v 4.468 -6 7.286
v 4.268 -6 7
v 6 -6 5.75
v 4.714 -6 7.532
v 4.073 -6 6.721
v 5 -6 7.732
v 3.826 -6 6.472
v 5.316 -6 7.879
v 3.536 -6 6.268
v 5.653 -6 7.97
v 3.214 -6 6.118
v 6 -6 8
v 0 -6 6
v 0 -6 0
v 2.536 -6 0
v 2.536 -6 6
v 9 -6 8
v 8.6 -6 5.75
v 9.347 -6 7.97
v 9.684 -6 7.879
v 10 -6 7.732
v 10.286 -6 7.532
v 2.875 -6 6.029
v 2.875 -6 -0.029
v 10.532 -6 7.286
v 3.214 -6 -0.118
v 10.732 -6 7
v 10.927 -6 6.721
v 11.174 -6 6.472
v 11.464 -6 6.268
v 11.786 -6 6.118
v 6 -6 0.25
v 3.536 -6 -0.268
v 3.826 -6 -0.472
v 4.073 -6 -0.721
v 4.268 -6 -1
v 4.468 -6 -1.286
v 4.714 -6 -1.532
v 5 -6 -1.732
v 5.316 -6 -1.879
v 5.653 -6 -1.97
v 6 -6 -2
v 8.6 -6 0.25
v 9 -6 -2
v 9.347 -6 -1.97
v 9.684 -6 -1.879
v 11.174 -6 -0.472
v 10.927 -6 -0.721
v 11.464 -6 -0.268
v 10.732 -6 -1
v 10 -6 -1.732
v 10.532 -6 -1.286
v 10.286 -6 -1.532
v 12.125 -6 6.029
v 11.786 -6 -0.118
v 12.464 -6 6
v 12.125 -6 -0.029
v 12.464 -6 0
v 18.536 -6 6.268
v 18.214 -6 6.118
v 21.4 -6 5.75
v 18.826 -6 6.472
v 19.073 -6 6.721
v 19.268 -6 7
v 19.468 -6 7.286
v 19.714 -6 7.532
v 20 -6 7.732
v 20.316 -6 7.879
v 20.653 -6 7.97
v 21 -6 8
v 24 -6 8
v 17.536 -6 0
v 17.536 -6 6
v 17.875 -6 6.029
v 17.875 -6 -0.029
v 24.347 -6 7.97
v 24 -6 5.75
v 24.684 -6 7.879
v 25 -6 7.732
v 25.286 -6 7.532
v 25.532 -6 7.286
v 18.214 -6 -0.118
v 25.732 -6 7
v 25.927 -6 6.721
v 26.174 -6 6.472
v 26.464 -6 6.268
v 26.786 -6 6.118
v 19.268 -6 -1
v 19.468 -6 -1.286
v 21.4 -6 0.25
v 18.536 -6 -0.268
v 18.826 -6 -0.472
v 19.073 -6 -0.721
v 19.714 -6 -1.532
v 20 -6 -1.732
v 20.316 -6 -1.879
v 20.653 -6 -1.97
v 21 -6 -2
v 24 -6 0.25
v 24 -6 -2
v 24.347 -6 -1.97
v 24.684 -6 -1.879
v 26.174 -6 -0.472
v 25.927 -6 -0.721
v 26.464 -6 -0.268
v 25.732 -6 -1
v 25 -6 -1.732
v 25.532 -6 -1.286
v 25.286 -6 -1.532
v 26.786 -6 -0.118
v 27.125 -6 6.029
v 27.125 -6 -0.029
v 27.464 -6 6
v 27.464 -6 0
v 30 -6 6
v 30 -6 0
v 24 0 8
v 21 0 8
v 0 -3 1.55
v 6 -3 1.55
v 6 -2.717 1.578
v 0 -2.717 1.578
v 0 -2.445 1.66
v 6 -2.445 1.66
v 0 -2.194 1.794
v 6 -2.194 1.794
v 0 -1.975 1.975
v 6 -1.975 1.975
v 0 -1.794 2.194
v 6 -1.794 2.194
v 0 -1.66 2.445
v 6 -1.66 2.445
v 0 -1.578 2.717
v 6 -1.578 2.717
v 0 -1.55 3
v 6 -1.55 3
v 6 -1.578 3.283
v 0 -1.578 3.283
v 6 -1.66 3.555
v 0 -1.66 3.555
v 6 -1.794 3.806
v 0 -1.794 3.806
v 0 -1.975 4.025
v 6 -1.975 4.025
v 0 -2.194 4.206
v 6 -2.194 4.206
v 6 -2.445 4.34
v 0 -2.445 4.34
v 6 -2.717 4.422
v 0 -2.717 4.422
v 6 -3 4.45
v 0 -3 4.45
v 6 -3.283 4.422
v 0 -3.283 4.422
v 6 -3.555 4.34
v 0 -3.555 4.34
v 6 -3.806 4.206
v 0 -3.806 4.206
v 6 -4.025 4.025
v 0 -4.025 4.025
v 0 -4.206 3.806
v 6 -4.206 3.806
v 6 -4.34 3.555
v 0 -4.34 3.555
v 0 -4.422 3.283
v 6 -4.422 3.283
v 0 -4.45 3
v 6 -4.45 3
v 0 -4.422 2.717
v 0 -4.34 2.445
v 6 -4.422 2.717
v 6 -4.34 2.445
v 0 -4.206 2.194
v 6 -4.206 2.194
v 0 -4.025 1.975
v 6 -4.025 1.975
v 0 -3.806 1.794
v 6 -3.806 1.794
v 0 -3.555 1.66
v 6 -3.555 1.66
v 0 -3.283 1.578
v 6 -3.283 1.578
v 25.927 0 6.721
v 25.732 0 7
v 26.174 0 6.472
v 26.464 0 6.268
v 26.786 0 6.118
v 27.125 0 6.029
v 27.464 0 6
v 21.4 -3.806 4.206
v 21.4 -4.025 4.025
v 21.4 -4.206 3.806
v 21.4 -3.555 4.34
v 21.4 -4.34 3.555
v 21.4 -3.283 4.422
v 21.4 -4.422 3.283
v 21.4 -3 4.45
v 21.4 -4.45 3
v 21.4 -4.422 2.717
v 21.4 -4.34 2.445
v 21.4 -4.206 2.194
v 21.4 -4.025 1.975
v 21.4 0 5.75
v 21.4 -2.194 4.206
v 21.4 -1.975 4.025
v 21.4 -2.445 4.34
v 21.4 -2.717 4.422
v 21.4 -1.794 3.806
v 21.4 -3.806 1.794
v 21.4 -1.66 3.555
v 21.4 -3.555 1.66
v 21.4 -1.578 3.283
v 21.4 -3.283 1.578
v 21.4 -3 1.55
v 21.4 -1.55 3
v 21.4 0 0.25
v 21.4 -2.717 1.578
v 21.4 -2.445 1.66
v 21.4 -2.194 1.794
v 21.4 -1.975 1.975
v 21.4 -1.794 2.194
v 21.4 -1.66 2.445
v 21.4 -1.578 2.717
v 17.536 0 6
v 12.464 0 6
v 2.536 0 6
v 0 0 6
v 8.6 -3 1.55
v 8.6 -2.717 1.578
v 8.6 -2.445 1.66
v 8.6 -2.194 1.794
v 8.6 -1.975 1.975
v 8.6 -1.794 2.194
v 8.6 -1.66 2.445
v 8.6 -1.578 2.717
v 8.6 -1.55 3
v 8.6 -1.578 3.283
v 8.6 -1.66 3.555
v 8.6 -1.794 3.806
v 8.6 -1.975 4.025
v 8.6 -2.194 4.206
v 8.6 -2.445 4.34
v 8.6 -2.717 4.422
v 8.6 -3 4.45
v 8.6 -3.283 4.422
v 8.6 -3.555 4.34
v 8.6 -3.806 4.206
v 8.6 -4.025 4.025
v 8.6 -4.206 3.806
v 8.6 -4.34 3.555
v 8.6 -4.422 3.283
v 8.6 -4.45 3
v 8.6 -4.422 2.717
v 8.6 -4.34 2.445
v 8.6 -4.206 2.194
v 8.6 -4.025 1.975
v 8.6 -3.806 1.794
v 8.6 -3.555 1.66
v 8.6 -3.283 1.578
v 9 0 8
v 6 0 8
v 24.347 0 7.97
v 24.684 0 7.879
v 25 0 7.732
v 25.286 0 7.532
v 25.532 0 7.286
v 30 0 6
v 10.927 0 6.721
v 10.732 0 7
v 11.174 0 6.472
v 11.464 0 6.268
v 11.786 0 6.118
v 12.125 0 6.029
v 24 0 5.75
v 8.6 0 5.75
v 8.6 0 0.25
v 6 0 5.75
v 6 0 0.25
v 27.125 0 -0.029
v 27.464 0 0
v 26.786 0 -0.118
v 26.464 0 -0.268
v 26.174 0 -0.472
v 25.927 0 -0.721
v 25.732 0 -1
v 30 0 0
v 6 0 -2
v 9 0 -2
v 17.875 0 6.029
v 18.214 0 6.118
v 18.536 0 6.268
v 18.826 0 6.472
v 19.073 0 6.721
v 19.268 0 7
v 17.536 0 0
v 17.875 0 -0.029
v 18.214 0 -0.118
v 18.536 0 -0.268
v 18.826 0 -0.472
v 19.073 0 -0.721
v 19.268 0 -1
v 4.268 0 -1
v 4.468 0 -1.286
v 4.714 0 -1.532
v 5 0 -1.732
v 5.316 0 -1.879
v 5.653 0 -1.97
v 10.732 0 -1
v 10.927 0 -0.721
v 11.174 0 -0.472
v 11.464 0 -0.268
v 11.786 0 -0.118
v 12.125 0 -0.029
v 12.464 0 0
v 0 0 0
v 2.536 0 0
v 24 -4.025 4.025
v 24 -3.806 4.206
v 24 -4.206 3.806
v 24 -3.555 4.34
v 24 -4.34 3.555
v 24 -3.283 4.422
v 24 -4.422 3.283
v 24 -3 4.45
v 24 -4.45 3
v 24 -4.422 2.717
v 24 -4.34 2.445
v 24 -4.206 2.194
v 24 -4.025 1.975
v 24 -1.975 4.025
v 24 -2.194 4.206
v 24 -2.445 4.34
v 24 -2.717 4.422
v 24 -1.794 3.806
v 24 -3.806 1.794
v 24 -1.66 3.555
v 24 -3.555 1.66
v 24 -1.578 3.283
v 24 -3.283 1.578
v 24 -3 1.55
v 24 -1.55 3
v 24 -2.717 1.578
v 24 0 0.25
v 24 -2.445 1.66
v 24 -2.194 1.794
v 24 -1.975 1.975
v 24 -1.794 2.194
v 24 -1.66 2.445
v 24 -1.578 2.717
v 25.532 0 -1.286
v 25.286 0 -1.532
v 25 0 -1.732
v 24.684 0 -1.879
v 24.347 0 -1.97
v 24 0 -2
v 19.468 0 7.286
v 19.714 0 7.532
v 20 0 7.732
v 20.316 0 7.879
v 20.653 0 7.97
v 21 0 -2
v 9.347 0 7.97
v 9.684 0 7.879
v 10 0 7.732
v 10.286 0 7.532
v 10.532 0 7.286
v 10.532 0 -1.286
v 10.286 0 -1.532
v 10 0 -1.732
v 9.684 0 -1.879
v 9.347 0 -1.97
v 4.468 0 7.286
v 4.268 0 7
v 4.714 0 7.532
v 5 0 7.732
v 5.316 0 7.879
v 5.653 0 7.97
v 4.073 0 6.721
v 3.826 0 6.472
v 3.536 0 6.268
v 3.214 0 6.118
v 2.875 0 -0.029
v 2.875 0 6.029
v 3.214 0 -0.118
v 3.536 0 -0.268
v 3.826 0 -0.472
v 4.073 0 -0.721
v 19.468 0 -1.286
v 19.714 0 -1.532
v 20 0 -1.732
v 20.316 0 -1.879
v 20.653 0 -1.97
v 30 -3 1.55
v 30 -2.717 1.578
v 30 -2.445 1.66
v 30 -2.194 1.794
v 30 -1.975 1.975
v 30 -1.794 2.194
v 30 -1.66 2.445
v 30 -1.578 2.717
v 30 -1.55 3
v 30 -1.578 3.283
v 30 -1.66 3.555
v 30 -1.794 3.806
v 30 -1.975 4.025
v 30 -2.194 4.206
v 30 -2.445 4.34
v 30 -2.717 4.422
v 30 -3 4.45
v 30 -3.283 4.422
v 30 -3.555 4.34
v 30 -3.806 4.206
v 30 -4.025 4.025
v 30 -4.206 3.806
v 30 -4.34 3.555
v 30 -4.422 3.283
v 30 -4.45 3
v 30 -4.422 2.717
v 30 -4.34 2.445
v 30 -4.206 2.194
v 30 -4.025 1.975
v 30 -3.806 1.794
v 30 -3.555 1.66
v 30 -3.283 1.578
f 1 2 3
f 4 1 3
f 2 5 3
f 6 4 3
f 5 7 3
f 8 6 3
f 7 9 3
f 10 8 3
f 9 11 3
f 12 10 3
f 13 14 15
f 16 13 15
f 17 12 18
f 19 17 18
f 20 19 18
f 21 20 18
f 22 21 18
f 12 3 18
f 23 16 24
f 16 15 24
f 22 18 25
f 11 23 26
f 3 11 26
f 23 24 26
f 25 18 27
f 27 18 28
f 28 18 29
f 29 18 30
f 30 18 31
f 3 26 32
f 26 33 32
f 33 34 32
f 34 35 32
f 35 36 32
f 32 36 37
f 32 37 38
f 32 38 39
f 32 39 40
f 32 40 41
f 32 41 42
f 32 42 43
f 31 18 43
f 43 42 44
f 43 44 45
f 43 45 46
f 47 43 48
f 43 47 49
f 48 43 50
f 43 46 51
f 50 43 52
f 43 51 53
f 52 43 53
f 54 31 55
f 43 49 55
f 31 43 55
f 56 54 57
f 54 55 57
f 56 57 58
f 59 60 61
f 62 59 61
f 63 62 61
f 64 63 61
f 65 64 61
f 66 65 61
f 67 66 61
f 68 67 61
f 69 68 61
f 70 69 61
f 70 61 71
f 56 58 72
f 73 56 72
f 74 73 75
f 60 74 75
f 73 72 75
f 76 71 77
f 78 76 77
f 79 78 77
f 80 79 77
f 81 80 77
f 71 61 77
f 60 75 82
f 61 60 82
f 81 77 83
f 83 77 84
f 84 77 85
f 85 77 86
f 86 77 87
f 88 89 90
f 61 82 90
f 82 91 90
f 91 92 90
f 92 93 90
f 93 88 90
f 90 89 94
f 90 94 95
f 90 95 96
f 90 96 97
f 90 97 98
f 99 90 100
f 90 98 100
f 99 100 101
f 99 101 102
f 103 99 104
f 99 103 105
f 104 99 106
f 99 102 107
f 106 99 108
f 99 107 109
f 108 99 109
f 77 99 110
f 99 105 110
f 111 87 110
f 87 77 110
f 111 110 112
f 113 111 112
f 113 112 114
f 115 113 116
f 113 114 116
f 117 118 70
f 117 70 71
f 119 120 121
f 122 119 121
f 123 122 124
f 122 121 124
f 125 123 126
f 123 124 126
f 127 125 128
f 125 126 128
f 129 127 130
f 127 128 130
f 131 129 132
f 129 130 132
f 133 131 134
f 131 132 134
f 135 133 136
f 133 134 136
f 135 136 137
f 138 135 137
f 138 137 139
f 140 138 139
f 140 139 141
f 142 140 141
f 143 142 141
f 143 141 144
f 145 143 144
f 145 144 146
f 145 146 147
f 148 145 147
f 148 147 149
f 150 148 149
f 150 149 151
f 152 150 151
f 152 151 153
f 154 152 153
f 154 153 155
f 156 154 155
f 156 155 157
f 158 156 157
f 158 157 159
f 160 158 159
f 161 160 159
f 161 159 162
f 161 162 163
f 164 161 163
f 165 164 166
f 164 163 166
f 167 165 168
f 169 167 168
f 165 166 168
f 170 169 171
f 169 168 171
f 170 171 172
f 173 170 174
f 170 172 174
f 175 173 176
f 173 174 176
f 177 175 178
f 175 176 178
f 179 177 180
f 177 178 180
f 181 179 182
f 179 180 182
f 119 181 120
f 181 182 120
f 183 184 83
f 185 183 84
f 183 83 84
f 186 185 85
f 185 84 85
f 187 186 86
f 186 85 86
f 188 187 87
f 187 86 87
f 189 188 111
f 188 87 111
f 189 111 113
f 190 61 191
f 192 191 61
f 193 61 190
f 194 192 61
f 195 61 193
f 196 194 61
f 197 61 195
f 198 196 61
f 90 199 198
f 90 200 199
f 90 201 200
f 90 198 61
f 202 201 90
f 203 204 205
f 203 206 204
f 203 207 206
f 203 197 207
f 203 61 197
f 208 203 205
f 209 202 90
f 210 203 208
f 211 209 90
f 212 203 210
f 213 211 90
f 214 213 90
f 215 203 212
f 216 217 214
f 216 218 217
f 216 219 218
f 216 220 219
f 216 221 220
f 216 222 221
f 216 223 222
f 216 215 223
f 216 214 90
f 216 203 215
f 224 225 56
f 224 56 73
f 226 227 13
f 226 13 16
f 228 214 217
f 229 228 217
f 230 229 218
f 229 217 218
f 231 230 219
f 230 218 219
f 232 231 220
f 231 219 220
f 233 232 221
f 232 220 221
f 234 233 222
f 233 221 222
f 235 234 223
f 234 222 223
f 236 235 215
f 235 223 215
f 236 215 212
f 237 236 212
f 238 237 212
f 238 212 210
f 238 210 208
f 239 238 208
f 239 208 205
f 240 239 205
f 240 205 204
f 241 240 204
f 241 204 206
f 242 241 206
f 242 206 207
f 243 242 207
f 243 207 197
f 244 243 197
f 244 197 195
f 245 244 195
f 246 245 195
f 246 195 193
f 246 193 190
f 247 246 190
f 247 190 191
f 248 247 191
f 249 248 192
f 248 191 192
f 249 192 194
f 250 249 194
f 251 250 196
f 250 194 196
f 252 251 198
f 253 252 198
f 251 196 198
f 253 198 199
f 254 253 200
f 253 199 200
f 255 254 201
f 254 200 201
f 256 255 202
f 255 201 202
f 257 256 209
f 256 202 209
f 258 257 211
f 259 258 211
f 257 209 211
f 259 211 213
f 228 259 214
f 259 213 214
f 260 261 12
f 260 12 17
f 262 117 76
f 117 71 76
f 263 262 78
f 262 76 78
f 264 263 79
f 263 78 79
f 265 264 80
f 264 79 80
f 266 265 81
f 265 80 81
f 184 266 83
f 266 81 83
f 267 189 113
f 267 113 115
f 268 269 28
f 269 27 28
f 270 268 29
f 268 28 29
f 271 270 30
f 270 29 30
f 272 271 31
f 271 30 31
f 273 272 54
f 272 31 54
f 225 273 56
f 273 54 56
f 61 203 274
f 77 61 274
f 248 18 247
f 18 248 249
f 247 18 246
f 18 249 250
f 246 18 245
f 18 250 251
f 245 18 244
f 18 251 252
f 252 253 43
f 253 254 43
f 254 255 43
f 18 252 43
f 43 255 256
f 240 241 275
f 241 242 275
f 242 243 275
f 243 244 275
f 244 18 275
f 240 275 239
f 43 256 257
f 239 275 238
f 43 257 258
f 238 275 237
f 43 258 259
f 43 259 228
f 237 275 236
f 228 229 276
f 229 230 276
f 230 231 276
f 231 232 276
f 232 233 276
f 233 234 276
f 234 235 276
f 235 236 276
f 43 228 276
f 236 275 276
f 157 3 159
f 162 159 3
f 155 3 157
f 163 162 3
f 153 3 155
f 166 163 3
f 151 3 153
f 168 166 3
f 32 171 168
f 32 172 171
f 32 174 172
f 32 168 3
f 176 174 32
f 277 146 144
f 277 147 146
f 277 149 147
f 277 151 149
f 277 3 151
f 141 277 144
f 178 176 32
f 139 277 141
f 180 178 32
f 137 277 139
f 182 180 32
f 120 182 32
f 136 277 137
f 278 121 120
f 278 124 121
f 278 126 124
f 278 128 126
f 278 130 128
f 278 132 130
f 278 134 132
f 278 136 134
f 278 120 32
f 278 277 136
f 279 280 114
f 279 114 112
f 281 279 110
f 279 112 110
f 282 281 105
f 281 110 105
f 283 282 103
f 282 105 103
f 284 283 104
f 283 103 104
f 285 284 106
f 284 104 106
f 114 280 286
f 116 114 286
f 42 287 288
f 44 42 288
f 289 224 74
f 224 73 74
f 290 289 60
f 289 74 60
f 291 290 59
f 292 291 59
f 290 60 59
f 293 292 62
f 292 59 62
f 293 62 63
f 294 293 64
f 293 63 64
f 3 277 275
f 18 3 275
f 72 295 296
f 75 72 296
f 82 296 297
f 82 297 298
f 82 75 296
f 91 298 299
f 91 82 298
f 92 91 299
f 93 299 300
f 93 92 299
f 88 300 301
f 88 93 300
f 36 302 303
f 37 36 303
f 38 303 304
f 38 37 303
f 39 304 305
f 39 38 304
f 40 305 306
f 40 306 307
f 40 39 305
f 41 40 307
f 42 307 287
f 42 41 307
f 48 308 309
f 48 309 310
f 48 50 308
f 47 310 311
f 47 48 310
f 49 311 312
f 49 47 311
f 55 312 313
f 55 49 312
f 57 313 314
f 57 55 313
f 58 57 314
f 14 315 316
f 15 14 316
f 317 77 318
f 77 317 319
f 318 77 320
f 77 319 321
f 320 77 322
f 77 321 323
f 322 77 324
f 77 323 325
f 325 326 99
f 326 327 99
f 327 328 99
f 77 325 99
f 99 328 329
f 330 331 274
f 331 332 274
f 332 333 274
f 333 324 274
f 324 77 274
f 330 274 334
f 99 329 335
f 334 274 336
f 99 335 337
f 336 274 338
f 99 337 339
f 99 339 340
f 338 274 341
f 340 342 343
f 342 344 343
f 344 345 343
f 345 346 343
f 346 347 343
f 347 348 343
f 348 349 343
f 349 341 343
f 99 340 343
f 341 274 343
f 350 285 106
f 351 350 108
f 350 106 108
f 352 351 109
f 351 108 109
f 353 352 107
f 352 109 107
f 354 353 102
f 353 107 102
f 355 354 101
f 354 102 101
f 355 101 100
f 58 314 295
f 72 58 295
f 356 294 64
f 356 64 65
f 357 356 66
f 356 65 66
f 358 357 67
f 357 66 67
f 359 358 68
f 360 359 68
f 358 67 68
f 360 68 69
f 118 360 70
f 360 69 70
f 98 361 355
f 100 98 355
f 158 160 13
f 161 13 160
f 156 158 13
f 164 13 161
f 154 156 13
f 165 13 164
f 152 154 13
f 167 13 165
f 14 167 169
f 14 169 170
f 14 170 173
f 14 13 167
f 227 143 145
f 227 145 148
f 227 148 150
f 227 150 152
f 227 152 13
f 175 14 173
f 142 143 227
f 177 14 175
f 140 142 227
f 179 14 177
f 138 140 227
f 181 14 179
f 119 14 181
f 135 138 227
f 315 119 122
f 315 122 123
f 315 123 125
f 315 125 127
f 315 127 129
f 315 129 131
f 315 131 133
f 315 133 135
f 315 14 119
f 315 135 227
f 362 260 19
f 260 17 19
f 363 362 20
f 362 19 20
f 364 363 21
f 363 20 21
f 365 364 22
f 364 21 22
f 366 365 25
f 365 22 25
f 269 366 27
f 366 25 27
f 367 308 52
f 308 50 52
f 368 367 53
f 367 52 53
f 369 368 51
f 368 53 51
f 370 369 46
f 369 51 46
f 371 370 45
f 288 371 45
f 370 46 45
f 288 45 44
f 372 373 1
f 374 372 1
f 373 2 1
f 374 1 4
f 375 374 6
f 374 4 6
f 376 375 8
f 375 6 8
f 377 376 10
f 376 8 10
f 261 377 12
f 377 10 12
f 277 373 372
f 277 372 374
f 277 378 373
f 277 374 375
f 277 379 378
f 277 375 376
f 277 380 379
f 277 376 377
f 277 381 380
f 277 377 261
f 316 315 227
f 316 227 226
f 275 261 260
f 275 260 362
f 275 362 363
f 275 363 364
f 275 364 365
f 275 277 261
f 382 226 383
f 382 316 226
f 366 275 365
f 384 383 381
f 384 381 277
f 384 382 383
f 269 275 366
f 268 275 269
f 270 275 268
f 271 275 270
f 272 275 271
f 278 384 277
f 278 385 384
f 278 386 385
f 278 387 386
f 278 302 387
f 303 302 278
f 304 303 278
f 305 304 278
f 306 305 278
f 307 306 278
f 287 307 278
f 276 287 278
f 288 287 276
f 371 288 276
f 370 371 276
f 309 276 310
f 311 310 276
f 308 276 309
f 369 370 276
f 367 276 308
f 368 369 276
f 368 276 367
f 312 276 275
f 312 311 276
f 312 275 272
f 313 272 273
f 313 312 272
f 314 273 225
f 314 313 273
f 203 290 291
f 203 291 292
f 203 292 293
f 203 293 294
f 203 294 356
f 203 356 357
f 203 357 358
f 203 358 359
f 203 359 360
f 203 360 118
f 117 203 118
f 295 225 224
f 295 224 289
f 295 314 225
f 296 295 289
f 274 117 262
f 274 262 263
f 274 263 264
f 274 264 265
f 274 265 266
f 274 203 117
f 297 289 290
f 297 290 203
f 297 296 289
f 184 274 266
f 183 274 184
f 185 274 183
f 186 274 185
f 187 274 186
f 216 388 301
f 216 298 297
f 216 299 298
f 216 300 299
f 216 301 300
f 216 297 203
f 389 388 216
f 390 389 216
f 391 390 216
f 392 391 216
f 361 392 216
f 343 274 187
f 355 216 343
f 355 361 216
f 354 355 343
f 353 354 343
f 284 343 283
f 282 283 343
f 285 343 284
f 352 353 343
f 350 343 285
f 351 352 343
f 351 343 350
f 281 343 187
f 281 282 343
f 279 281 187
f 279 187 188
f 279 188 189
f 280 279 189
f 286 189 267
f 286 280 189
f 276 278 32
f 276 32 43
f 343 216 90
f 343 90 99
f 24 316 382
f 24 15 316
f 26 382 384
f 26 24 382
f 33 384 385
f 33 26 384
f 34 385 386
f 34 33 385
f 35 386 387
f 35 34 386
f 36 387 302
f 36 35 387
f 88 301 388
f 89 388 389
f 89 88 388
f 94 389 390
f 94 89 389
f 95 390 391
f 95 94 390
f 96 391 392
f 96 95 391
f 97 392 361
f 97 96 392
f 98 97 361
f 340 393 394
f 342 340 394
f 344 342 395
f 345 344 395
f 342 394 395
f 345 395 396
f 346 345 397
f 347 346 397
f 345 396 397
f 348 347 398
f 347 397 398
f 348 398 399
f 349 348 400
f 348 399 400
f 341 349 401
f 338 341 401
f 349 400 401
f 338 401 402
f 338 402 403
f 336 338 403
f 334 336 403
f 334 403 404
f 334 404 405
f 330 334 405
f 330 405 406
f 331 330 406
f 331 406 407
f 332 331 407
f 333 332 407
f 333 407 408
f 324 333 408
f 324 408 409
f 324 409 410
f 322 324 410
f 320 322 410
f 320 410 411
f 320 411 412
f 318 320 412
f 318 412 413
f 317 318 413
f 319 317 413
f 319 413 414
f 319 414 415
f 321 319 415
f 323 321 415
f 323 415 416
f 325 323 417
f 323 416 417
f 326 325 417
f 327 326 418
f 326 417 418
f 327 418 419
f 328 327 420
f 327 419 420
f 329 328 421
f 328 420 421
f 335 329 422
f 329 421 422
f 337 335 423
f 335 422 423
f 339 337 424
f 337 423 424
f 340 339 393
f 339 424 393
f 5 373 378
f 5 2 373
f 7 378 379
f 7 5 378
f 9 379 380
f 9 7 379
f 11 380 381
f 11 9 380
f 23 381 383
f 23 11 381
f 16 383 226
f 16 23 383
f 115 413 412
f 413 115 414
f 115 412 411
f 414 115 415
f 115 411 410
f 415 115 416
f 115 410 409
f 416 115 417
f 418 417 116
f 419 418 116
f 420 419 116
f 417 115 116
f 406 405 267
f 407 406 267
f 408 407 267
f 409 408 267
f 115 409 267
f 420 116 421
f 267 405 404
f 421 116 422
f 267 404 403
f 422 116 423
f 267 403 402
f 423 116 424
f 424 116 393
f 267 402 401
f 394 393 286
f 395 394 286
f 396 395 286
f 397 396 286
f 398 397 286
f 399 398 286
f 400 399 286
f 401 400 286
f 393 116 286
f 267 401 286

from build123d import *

# Parameters (mm, degrees)
SKETCH1_W           = 30
SKETCH1_H           = 6
BOSS_EXTRUDE1_DEPTH = 6
SKETCH2_R           = 1.45
CUT_EXTRUDE1_DEPTH  = 32.176914536
SKETCH3_W           = 2.6
SKETCH3_H           = 5.5
CUT_EXTRUDE2_DEPTH  = 32.176914536
SKETCH4_W           = 7
SKETCH4_H           = 2
BOSS_EXTRUDE2_DEPTH = 6
FILLET1_R           = 2
FILLET2_R           = 2


with BuildPart() as part:
    # Sketch1 → Boss-Extrude1 (new body)
    with BuildSketch(Plane.XY):
        with Locations((15, -3)):
            Rectangle(SKETCH1_W, SKETCH1_H)
    extrude(amount=BOSS_EXTRUDE1_DEPTH)

    # Sketch2 → Cut-Extrude1 (cut, through all)
    with BuildSketch(Plane(origin=(30, 0, 0), x_dir=(0, 0, -1), z_dir=(1, 0, 0))):
        with Locations((-3, -3)):
            Circle(SKETCH2_R)
    extrude(amount=-CUT_EXTRUDE1_DEPTH, mode=Mode.SUBTRACT)

    # Sketch3 → Cut-Extrude2 (cut, through all)
    with BuildSketch(Plane(origin=(0, 0, 0), x_dir=(1, 0, 0), z_dir=(0, 1, 0))):
        with Locations((7.3, -3)):
            Rectangle(SKETCH3_W, SKETCH3_H)
        with Locations((22.7, -3)):
            Rectangle(SKETCH3_W, SKETCH3_H)
    extrude(amount=-CUT_EXTRUDE2_DEPTH, mode=Mode.SUBTRACT)

    # Sketch4 → Boss-Extrude2 (add)
    with BuildSketch(Plane(origin=(0, 0, 0), x_dir=(1, 0, 0), z_dir=(0, 1, 0))):
        with Locations((7.5, -7)):
            Rectangle(SKETCH4_W, SKETCH4_H)
        with Locations((22.5, -7)):
            Rectangle(SKETCH4_W, SKETCH4_H)
        with Locations((7.5, 1)):
            Rectangle(SKETCH4_W, SKETCH4_H)
        with Locations((22.5, 1)):
            Rectangle(SKETCH4_W, SKETCH4_H)
    extrude(amount=-BOSS_EXTRUDE2_DEPTH)

    # Fillet1
    fillet1_edges = [part.edges().sort_by_distance(p)[0] for p in [
        (26, -3, -2),
        (4, -3, -2),
        (11, -3, -2),
        (19, -3, -2),
        (26, -3, 8),
        (19, -3, 8),
        (11, -3, 8),
        (4, -3, 8),
    ]]
    fillet(fillet1_edges, radius=FILLET1_R - 0.0001)  # a hair under: the kernel refuses the full size

    # Fillet2
    fillet2_edges = [part.edges().sort_by_distance(p)[0] for p in [
        (4, -3, 6),
        (11, -3, 6),
        (19, -3, 6),
        (26, -3, 6),
        (4, -3, 0),
        (11, -3, 0),
        (19, -3, 0),
        (26, -3, 0),
    ]]
    fillet(fillet2_edges, radius=FILLET2_R)


solid = part.part
